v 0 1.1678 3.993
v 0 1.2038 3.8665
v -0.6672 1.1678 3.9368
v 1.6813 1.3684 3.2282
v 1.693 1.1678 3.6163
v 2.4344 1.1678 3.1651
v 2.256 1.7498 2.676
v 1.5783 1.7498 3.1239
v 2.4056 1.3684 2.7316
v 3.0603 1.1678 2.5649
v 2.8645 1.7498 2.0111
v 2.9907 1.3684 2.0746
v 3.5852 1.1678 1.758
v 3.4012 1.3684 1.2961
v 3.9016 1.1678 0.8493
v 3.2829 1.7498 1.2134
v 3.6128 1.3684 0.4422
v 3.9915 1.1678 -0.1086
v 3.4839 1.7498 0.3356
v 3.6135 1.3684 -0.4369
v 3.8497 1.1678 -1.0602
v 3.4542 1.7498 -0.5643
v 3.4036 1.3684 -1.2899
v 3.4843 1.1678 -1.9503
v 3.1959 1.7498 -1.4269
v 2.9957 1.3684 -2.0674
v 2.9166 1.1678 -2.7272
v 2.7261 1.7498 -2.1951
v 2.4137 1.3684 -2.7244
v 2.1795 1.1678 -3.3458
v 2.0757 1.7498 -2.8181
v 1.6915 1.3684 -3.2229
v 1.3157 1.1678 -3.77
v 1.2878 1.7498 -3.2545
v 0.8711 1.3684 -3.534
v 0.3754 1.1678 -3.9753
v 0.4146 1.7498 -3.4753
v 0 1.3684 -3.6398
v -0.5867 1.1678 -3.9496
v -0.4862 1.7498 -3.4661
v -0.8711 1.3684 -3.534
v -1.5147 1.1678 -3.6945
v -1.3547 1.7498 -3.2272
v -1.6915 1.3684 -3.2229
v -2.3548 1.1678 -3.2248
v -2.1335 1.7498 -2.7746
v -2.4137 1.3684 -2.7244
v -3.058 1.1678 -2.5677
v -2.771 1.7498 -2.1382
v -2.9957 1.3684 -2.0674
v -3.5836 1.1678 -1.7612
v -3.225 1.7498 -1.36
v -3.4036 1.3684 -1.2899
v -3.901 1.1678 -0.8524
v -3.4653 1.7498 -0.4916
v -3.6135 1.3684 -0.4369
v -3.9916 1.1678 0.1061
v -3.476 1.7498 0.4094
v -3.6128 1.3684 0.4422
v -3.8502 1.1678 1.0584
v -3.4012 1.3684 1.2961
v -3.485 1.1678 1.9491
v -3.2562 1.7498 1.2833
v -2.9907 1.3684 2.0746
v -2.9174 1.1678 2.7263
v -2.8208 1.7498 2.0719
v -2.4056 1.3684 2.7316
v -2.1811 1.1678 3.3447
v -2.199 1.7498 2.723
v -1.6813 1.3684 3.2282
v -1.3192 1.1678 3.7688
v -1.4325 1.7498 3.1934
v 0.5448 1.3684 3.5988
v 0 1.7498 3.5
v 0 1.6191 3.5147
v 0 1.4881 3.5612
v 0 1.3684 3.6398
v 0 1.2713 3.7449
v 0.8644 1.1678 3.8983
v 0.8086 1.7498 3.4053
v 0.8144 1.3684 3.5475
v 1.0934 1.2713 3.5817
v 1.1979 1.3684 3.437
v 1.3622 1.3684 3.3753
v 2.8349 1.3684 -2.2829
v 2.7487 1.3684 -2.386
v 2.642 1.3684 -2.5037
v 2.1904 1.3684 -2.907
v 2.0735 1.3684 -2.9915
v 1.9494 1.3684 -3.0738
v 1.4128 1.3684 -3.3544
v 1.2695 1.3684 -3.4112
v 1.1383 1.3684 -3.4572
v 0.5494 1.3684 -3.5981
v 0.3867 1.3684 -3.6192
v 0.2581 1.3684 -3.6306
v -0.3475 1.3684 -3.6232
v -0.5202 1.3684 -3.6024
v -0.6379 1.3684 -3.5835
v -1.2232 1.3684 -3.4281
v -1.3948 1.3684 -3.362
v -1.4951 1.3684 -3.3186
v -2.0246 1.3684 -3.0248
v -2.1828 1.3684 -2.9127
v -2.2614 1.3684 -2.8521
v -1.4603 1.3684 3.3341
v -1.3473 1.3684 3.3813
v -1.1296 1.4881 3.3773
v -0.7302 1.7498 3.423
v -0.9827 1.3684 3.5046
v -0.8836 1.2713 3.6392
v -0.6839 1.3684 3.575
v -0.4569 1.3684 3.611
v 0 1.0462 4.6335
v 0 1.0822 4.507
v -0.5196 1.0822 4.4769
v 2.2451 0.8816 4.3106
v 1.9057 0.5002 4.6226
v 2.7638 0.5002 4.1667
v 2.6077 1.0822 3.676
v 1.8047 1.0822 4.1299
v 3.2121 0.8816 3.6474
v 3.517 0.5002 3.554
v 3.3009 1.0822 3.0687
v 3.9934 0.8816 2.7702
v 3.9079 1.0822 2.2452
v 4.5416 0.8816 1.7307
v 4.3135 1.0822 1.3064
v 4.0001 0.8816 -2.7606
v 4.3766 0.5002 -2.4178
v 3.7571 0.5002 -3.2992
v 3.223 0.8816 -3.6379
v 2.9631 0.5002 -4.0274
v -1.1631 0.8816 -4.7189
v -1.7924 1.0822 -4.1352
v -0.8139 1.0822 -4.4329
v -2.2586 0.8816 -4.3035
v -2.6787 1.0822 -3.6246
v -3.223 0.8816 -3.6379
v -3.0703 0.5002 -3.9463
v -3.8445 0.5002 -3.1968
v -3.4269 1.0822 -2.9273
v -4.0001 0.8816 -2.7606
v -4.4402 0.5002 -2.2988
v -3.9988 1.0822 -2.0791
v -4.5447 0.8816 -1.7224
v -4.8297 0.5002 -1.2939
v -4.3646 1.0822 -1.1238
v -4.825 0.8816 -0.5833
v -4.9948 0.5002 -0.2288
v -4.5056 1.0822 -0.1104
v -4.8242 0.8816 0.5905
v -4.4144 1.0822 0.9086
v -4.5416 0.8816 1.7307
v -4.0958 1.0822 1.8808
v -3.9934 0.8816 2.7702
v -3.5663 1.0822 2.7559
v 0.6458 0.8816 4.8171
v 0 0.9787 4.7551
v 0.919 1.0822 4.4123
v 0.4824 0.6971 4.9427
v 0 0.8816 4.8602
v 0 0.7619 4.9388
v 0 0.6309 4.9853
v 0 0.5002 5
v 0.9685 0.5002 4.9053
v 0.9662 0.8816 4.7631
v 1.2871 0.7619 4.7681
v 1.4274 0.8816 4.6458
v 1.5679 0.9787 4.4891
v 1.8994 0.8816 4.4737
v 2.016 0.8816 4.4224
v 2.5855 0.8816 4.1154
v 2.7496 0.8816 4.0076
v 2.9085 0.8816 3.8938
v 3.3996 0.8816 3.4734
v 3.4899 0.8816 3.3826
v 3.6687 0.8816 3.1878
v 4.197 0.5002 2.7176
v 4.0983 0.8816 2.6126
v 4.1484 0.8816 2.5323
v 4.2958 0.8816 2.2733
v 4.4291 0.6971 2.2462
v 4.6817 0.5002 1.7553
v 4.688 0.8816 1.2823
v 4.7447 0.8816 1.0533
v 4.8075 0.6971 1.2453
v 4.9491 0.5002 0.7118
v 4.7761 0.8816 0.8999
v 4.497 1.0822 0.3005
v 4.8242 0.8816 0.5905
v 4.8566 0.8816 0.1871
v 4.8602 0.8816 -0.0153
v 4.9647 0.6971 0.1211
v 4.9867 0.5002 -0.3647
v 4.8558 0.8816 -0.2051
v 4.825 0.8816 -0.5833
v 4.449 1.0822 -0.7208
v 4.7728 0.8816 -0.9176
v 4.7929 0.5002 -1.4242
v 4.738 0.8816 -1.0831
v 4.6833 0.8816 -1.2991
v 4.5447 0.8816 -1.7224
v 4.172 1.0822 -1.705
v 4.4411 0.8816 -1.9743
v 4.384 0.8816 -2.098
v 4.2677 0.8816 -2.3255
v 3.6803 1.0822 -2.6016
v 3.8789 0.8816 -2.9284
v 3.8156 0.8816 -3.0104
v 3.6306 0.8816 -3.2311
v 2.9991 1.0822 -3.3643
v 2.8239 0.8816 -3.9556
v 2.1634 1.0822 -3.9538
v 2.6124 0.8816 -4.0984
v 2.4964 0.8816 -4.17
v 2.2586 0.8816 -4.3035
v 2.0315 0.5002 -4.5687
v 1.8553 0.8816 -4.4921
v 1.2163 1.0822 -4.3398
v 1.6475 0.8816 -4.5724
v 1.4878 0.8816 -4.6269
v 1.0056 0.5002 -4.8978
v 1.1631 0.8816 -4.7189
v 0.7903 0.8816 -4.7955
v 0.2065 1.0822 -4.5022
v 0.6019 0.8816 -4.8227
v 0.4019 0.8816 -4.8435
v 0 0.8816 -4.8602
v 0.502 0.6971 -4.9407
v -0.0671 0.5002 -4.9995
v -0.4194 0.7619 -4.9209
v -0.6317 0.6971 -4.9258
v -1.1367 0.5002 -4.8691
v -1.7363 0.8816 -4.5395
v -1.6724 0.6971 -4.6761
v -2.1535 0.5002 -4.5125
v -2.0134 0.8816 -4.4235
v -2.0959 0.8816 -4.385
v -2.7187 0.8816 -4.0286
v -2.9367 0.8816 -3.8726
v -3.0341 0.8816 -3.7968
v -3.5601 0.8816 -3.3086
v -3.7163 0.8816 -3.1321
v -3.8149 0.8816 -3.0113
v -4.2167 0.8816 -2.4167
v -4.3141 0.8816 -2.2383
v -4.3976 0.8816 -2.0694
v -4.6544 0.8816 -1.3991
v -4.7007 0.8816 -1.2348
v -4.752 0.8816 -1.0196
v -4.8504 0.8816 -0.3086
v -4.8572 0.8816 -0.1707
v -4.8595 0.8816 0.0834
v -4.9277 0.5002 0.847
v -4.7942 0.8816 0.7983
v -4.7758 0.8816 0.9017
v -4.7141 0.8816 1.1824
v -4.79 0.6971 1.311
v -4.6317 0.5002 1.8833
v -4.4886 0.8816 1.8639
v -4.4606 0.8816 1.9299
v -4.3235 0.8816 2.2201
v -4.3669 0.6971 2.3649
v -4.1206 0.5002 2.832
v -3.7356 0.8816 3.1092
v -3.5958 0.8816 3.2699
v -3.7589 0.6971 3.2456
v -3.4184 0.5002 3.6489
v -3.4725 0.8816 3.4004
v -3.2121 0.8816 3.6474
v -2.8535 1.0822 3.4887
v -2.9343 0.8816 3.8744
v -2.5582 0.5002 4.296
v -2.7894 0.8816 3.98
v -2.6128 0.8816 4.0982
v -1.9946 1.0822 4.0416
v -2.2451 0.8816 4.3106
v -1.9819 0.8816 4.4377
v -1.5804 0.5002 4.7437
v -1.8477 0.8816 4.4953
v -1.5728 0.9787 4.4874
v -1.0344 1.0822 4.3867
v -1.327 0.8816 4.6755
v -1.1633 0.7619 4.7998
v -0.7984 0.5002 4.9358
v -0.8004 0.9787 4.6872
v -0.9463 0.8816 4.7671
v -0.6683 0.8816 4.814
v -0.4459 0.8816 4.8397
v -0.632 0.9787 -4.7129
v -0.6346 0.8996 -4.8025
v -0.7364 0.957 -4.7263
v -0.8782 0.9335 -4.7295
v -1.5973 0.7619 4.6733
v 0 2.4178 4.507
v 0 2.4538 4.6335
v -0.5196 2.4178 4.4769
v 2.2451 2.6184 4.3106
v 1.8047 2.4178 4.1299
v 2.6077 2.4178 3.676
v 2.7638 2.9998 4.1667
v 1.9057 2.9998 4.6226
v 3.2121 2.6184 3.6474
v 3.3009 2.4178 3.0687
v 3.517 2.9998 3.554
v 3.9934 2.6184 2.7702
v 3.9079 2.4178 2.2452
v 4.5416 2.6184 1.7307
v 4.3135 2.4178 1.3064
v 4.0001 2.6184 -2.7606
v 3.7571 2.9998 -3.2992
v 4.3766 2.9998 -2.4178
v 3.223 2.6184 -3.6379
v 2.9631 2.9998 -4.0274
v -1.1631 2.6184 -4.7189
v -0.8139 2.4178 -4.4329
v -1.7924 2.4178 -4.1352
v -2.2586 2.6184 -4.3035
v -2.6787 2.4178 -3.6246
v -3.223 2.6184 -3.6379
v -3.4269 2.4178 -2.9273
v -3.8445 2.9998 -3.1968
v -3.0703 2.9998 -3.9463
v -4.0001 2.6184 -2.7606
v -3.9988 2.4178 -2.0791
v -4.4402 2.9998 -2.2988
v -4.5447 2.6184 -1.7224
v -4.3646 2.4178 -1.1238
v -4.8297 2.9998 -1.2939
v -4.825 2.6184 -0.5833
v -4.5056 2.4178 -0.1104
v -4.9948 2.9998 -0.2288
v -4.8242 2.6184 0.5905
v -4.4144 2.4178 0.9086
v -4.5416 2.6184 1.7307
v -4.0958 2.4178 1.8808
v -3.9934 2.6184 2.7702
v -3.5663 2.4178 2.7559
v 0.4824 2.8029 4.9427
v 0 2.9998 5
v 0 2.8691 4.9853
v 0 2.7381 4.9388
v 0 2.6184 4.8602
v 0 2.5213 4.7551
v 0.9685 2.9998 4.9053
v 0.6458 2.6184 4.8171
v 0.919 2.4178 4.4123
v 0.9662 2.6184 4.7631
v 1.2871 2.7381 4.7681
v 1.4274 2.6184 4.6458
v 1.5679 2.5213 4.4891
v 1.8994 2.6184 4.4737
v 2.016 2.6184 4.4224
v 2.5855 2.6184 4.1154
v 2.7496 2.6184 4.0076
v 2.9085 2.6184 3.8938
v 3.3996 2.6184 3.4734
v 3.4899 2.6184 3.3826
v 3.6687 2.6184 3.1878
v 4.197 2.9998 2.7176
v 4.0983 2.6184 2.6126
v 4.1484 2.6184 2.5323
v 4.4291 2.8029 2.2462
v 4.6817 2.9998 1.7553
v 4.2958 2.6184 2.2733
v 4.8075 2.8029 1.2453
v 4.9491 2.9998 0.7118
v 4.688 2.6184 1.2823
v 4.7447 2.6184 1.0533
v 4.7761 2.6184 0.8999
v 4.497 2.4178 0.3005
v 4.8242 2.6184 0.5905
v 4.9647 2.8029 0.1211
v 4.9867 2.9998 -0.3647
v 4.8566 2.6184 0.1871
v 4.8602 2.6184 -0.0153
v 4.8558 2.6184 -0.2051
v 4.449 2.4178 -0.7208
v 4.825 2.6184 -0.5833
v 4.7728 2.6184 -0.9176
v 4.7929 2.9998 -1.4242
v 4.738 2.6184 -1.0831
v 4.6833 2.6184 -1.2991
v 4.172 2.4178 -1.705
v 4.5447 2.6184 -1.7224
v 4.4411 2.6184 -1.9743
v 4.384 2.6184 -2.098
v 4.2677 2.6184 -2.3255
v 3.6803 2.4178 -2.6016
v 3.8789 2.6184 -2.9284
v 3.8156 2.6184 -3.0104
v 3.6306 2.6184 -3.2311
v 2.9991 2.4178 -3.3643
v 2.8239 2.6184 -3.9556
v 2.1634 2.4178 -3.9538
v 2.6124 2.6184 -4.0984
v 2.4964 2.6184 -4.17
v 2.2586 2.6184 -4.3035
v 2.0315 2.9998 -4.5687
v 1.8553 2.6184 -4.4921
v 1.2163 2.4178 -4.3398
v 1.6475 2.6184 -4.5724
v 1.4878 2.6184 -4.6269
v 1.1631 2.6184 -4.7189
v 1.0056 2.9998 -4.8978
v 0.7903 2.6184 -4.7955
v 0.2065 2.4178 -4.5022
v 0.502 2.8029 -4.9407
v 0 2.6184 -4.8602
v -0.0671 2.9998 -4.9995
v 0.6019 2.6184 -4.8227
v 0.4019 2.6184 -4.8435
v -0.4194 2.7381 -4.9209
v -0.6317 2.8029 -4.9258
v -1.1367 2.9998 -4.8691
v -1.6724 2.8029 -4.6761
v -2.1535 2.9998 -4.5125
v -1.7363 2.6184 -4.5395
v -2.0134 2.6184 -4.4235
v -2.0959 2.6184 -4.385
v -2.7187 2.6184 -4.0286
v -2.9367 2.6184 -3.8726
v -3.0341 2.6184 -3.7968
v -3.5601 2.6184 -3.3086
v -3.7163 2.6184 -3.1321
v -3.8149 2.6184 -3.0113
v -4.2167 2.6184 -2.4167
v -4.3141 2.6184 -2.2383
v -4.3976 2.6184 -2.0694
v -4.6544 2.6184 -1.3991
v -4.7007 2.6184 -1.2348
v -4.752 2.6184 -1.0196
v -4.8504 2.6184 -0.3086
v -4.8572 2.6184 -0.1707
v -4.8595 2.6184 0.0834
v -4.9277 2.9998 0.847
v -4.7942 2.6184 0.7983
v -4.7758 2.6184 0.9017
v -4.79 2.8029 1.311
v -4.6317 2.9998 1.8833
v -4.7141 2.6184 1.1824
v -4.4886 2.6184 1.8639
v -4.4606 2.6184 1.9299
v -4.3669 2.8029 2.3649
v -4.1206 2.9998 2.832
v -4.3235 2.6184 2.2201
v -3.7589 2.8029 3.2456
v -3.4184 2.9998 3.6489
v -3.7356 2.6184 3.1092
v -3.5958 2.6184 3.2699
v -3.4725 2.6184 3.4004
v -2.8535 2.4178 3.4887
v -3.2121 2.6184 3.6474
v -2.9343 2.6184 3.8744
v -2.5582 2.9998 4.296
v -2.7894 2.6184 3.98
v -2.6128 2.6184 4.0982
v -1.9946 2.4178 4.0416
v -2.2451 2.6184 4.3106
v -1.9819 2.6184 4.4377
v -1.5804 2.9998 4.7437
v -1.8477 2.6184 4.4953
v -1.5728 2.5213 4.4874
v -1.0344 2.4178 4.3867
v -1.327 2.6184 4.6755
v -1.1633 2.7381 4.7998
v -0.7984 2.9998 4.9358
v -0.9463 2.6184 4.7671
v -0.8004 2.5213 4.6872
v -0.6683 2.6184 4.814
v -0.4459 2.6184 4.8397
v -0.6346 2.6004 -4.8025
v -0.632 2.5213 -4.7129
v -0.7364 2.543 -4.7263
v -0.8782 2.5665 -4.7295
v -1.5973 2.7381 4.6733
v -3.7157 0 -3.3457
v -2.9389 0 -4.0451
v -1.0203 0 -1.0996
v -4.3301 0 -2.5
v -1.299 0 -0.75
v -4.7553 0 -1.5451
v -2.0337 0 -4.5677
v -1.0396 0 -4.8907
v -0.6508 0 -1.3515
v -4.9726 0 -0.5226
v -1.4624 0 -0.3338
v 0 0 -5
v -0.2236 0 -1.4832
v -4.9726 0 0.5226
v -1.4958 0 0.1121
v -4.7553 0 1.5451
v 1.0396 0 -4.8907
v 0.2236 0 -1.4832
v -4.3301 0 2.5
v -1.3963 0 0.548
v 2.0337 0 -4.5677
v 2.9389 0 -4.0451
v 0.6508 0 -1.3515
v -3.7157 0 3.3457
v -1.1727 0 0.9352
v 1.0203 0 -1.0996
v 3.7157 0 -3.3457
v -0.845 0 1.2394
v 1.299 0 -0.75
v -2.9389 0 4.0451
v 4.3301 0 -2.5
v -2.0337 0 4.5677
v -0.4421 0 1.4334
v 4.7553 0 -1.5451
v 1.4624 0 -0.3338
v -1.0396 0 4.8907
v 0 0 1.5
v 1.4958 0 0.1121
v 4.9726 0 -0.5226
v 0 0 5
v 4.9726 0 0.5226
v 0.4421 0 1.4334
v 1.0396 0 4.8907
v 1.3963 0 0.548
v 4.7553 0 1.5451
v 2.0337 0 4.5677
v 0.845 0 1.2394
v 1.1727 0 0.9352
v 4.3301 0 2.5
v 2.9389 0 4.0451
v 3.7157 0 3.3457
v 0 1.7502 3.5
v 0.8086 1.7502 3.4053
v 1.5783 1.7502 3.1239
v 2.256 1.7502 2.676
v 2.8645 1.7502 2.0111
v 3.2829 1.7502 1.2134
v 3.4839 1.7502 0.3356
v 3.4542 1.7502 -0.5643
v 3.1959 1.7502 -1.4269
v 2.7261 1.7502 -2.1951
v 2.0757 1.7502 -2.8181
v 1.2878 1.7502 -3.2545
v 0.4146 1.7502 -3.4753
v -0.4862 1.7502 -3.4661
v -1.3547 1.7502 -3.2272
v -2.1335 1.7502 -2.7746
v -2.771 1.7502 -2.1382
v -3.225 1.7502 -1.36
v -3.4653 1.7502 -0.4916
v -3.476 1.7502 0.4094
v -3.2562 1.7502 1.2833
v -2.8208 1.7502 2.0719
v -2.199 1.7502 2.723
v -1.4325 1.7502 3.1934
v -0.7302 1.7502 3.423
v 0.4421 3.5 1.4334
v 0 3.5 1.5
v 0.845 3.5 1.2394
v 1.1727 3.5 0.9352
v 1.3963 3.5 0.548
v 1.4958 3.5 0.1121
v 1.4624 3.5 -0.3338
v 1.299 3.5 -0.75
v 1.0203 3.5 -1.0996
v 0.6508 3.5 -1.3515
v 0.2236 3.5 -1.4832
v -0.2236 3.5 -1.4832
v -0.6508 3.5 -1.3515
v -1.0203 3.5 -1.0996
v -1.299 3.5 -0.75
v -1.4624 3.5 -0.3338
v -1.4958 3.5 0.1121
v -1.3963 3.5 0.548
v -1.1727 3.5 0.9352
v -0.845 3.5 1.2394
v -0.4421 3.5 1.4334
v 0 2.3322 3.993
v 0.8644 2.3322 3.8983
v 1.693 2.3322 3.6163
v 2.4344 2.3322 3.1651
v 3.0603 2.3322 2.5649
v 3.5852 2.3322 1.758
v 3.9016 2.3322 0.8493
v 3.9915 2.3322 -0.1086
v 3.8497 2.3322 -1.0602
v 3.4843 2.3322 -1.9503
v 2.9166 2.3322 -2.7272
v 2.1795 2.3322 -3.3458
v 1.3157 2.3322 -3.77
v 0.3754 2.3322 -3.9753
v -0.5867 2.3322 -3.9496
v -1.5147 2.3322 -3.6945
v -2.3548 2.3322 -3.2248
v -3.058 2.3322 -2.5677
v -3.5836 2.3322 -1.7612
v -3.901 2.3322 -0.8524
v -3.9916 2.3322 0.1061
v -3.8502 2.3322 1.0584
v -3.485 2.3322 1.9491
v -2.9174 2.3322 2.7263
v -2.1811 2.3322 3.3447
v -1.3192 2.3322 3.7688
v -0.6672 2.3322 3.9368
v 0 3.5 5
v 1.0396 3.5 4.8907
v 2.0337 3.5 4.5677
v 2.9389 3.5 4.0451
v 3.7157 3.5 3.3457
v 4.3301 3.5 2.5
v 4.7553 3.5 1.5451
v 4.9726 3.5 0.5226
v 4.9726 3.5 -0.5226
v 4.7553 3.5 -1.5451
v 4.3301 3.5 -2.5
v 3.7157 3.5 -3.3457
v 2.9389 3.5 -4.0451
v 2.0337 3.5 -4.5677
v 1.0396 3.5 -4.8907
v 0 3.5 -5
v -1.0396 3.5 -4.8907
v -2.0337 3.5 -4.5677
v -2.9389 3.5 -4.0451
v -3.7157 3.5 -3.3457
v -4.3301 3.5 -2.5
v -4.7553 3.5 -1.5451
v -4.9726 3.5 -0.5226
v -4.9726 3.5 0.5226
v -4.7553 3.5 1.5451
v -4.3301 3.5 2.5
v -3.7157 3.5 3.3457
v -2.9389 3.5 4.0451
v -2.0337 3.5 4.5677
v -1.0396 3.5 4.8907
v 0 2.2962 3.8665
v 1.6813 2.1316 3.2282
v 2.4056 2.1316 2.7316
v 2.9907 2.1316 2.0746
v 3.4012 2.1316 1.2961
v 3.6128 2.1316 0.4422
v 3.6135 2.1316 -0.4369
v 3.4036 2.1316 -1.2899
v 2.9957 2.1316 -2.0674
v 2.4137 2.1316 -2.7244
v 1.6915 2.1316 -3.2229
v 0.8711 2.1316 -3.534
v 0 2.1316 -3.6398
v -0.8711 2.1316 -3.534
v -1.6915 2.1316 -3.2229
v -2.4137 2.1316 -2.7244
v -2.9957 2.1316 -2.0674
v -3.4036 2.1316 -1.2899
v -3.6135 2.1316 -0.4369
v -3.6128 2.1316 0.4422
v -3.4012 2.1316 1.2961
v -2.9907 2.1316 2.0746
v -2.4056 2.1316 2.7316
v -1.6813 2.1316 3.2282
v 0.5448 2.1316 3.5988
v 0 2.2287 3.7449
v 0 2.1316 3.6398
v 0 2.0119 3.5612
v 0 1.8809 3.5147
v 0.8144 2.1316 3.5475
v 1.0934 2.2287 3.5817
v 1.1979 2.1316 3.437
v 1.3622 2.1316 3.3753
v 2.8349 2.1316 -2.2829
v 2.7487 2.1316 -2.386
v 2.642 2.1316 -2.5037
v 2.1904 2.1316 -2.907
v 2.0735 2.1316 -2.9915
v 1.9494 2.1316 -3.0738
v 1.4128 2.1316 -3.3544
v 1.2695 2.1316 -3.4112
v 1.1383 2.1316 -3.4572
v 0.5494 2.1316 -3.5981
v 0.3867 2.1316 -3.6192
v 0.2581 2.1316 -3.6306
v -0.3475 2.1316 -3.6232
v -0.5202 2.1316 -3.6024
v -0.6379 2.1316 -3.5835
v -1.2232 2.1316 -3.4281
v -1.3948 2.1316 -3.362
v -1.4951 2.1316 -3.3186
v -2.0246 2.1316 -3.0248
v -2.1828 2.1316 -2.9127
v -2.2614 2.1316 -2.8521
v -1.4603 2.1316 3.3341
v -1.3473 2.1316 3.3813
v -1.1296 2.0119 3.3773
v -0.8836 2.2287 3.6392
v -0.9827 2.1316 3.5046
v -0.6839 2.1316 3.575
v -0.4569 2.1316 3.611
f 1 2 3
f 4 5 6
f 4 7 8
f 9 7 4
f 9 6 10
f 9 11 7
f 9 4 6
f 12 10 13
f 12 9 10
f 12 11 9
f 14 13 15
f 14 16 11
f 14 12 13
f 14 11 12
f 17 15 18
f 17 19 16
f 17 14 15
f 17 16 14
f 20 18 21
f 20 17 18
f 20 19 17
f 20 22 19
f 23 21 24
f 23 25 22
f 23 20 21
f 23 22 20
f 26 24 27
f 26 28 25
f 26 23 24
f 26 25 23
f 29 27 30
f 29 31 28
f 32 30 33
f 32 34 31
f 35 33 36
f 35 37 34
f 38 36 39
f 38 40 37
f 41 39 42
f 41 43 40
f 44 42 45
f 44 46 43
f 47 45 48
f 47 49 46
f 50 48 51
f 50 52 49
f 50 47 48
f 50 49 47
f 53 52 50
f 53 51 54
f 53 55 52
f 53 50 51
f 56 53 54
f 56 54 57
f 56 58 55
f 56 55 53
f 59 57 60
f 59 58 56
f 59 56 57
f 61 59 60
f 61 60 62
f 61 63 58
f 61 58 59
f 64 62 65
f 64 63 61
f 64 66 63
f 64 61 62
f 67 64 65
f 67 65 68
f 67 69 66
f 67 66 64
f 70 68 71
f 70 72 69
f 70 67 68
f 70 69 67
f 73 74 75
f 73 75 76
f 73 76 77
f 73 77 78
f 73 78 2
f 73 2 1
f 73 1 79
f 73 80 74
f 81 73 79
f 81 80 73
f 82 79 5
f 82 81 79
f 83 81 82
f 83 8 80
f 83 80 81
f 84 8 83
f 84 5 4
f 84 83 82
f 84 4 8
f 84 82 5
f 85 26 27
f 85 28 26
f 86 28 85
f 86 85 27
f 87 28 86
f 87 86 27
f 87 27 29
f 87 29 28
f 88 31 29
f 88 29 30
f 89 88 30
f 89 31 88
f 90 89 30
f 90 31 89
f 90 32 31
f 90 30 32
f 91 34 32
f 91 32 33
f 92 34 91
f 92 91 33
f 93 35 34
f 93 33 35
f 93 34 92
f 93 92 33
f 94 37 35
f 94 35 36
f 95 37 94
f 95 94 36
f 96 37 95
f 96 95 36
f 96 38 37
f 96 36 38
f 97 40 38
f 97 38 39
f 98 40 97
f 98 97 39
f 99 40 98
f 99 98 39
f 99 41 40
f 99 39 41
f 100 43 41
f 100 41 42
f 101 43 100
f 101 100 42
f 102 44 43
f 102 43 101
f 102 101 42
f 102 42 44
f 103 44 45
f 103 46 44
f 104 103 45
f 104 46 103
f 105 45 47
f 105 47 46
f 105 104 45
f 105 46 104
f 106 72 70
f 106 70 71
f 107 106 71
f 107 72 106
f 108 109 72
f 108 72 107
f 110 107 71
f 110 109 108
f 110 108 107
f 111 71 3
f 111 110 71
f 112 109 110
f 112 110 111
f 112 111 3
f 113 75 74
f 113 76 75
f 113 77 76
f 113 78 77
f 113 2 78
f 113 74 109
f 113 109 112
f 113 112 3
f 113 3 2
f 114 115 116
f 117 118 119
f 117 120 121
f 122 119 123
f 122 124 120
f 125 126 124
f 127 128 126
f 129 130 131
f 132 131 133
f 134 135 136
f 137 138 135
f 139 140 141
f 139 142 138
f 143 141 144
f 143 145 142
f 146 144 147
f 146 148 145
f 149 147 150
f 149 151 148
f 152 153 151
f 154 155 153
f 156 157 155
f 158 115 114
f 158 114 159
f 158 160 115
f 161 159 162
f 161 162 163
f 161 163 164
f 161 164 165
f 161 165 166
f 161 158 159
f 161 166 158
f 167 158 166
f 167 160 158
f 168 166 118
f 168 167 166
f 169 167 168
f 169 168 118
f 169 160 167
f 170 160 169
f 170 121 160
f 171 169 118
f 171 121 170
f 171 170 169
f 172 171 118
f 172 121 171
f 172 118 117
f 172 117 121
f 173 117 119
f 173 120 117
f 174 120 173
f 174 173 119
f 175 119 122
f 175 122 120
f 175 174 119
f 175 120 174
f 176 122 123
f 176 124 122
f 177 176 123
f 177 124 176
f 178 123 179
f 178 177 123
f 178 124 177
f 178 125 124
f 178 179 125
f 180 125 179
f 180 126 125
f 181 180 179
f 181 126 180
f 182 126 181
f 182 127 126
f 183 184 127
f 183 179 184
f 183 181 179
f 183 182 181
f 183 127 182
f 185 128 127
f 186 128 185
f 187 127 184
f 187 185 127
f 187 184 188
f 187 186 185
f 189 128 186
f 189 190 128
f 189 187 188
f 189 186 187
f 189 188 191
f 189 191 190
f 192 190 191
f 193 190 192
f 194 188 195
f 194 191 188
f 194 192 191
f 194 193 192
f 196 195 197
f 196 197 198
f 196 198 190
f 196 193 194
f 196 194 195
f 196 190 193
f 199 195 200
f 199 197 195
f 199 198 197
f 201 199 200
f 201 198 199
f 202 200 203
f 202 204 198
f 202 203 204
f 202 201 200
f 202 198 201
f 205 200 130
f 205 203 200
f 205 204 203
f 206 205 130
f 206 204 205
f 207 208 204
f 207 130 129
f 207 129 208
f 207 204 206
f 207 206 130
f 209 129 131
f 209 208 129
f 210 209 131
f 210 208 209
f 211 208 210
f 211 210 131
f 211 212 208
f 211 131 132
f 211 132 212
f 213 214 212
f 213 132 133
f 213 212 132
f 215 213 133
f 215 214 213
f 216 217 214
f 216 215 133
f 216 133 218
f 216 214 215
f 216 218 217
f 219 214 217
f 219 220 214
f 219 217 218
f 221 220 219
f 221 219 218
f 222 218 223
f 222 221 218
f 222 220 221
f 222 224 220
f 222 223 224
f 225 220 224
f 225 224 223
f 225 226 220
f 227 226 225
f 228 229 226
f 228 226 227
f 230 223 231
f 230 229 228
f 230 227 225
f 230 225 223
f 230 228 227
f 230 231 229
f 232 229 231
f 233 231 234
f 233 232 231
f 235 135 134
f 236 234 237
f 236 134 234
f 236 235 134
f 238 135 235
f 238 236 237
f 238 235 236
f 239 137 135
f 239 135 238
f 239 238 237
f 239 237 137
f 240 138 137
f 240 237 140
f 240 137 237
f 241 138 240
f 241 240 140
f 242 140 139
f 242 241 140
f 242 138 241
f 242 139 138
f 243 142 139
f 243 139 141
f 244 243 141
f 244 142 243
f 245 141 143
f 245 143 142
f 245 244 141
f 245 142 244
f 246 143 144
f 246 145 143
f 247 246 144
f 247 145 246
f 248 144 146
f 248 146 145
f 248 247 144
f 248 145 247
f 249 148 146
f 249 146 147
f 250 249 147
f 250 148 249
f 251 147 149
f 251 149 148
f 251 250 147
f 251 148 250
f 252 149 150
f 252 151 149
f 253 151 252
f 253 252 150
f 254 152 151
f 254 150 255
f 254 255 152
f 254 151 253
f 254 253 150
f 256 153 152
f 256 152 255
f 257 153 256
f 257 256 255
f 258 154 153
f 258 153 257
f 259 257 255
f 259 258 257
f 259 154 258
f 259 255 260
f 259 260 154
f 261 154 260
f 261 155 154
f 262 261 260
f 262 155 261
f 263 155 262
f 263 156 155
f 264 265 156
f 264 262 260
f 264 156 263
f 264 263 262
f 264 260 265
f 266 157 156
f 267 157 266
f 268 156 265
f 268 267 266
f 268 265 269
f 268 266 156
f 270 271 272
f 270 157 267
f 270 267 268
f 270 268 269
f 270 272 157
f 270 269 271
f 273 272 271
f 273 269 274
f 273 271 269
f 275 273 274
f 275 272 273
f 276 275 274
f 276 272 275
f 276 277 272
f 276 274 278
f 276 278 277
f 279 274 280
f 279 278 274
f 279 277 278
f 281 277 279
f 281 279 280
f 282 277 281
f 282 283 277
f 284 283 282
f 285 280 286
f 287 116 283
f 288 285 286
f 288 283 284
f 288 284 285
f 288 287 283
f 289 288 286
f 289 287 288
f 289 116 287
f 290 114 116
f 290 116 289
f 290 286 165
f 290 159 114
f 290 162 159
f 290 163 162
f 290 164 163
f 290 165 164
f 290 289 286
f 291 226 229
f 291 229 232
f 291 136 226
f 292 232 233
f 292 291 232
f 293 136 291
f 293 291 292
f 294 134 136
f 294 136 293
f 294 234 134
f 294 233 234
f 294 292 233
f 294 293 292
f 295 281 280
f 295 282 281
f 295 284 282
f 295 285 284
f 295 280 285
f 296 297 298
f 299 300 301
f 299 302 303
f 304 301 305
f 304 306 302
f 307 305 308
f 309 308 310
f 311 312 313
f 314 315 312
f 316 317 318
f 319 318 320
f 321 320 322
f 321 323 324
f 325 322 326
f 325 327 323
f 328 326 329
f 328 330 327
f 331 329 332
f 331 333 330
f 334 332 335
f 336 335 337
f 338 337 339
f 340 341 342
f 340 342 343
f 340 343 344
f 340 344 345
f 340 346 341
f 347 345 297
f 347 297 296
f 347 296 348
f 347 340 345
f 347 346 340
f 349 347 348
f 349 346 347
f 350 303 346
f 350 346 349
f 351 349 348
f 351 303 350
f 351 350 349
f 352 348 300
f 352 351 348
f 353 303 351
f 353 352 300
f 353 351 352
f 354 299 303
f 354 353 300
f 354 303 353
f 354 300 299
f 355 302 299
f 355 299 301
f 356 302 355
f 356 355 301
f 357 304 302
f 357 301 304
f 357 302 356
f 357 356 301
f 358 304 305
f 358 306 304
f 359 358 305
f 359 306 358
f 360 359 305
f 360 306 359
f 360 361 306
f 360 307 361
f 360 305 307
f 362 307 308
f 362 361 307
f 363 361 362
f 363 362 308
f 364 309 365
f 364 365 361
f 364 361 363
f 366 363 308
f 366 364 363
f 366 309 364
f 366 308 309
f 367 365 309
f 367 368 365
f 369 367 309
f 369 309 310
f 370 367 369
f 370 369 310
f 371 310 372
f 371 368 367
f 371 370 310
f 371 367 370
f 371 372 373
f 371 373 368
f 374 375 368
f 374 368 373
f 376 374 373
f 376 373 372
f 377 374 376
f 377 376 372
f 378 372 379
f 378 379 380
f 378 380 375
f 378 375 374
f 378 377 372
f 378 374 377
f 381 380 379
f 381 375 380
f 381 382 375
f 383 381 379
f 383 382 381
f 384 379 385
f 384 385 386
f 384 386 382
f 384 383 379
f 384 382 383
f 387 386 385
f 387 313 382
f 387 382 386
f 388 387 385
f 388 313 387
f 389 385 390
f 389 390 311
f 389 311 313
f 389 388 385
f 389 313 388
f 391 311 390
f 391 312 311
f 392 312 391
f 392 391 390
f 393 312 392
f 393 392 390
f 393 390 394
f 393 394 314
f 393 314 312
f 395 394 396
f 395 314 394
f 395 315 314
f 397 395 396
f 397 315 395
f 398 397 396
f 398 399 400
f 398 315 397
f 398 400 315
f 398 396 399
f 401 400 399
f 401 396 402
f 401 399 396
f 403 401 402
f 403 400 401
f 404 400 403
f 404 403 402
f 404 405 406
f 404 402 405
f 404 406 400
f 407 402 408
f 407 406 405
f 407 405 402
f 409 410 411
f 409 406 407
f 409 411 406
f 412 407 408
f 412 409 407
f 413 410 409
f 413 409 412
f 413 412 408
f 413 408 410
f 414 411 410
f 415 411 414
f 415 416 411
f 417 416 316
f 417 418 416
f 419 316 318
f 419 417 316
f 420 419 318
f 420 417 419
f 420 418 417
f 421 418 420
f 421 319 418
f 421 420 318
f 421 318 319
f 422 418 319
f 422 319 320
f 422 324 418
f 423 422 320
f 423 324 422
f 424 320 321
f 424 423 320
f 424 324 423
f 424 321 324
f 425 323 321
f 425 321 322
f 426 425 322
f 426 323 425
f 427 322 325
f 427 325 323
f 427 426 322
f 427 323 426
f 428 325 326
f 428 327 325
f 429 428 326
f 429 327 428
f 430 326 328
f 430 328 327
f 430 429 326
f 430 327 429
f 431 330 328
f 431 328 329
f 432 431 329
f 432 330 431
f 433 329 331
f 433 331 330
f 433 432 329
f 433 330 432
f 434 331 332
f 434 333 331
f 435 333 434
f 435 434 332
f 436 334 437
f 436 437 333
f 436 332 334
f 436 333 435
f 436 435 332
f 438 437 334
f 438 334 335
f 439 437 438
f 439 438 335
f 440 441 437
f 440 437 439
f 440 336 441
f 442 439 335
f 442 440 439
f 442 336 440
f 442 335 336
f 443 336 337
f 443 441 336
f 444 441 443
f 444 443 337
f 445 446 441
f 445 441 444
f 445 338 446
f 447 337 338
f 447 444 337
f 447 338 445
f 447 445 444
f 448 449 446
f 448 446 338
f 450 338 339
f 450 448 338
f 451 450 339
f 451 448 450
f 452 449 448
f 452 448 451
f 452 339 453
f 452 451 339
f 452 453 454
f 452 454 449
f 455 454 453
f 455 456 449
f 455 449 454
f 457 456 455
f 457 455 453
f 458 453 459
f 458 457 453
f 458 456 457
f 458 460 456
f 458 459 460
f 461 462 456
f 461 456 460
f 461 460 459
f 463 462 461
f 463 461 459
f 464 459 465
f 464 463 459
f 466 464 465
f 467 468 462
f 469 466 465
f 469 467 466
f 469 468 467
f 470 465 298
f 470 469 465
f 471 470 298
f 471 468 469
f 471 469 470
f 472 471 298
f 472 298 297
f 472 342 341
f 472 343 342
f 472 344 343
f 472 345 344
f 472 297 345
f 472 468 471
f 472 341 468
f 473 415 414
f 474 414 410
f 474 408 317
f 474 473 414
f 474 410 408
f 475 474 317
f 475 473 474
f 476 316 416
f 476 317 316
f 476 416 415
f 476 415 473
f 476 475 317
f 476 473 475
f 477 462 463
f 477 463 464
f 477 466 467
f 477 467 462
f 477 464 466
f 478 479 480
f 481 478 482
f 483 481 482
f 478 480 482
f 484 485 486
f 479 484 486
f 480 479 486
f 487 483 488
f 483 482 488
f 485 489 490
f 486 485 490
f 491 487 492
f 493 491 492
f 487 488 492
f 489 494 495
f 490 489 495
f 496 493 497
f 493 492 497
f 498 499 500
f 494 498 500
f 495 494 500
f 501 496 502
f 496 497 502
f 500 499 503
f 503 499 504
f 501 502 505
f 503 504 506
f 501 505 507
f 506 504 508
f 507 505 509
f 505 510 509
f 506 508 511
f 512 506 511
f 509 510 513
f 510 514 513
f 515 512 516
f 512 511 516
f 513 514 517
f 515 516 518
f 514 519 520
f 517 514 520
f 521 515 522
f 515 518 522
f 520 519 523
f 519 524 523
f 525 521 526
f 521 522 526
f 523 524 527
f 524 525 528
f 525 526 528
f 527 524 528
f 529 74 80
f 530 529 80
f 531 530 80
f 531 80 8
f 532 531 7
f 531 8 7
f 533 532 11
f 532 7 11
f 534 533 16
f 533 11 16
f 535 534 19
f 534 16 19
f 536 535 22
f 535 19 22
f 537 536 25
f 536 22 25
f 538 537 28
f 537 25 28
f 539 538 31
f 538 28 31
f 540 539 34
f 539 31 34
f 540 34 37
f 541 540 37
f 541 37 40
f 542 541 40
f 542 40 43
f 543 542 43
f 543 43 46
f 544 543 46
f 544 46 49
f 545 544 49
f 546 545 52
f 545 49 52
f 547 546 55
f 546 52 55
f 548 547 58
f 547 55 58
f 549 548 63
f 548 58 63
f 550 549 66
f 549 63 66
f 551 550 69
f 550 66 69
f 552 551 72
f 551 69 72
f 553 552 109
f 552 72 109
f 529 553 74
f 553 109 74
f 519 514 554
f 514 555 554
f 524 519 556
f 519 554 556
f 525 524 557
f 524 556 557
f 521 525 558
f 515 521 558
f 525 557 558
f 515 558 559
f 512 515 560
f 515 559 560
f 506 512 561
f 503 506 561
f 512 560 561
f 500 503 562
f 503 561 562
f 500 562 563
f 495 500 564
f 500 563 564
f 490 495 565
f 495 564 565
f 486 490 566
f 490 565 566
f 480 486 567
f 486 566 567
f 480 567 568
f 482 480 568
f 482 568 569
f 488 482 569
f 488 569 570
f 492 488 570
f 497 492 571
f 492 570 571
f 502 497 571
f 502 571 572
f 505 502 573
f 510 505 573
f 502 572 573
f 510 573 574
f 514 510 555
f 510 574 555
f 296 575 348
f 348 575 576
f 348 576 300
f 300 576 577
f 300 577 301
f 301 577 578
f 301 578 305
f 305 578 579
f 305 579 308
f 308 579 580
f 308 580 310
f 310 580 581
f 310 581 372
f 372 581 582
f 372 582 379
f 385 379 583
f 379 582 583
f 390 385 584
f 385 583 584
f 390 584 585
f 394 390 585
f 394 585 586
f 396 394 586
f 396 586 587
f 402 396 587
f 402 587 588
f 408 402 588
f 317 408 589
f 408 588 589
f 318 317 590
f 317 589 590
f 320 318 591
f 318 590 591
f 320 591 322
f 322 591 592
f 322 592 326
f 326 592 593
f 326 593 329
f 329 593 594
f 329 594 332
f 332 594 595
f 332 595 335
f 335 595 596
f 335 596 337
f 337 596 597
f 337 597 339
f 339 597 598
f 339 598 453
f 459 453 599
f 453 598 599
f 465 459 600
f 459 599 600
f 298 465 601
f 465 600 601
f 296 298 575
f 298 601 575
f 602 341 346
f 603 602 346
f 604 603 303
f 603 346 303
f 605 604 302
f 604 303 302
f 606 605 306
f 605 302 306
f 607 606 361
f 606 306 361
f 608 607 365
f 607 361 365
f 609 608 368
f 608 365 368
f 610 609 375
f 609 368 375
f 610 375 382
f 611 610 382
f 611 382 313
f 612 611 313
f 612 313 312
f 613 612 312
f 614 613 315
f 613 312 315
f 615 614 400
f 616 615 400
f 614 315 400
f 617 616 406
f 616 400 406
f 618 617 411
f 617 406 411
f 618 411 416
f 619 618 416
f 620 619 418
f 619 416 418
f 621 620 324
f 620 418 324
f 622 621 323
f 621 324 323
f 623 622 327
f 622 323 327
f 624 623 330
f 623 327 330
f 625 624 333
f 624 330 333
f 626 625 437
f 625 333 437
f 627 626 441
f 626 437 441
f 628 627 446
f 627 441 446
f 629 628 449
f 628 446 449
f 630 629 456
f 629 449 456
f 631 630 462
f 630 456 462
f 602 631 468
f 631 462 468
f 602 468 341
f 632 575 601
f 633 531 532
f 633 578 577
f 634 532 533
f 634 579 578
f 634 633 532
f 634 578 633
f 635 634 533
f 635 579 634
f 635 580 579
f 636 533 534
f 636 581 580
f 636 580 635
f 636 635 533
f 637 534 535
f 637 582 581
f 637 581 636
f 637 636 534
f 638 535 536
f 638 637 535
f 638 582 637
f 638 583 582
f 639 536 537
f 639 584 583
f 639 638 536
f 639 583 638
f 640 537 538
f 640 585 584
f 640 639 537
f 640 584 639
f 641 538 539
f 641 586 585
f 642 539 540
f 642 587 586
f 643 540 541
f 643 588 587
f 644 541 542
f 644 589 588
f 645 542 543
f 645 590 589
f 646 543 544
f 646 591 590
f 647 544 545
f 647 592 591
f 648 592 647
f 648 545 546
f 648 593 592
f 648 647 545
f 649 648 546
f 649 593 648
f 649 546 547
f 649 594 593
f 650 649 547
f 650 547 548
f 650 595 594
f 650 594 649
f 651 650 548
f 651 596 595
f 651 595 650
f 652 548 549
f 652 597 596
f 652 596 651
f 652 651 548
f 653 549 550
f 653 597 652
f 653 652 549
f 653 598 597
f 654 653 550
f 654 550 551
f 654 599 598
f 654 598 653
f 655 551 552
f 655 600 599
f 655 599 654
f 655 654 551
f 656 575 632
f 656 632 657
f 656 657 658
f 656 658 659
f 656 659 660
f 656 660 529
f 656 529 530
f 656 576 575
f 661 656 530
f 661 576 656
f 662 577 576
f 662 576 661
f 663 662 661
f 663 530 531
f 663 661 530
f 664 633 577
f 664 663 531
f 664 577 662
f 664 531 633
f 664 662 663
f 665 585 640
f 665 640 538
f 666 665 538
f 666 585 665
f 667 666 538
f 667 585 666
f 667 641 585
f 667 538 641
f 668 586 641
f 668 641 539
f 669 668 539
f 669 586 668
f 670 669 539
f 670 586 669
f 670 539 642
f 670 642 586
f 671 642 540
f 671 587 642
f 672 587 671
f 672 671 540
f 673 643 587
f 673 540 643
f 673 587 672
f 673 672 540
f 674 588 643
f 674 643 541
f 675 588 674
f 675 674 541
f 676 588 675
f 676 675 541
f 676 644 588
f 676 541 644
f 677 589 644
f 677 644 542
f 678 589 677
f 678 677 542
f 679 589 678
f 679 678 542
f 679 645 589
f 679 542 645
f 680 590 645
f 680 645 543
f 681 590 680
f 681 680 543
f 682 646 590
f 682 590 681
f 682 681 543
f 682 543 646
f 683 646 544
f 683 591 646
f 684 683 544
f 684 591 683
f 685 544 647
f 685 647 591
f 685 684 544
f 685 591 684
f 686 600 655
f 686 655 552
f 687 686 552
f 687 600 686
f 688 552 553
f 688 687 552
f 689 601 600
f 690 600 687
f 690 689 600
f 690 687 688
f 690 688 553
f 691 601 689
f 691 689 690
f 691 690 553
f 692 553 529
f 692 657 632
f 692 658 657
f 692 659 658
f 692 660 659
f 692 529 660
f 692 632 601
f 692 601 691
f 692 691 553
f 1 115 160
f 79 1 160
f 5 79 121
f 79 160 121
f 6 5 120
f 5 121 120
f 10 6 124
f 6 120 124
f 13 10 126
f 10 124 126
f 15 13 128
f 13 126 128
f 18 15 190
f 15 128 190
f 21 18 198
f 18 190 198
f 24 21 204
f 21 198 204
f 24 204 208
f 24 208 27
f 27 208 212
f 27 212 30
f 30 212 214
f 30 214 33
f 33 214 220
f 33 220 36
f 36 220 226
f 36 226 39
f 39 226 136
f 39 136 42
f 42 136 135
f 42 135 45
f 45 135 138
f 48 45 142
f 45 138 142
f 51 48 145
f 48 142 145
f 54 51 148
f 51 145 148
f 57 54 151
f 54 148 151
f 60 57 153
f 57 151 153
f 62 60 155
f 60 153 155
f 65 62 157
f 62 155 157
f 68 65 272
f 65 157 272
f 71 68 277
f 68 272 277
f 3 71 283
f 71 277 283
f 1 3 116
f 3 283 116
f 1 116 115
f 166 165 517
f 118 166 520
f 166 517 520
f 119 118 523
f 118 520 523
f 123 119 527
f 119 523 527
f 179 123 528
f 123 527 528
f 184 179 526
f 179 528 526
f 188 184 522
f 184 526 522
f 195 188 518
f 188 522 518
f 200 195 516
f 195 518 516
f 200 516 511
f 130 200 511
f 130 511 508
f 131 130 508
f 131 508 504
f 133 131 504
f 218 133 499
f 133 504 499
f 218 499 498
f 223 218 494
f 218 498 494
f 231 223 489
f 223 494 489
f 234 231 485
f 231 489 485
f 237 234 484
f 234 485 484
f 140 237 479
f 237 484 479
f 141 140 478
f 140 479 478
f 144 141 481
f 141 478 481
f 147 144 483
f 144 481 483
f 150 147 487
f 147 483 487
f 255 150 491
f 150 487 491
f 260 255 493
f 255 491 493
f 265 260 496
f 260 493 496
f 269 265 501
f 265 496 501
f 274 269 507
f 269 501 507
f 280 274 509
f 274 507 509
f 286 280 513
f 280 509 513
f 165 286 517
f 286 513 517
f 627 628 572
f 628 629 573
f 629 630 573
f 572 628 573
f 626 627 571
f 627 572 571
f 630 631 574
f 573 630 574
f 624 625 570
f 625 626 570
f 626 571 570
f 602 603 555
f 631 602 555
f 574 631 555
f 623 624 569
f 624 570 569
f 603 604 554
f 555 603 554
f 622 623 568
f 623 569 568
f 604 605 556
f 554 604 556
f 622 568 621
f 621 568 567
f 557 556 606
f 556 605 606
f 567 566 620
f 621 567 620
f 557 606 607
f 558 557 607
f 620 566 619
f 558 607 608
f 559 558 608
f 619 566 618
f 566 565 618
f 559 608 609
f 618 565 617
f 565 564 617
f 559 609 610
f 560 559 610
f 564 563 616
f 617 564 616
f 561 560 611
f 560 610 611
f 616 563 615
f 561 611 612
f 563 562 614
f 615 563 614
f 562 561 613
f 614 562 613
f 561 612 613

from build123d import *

# Parameters (mm, degrees)
F2_R = 0.59


with BuildPart() as f1:
    # F0 (on Right) → F1 (revolve)
    with BuildSketch(Plane.YZ):
        Polygon((0, 5), (0, 1.5), (3.5, 1.5), (3.5, 5), (2.5, 5), (2.25, 3.5), (1.25, 3.5), (1, 5), align=None)
    revolve(axis=Axis((0, 1.75, 0), (0, 1, 0)))

    # F2
    f2_edges = [f1.edges().sort_by_distance(p)[0] for p in [
        (0, 1.25, -3.5),
        (0, 1, -5),
        (0, 1.125, 4.25),
        (0, 2.5, -5),
        (0, 2.25, -3.5),
        (0, 2.375, 4.25),
    ]]
    fillet(f2_edges, radius=F2_R)


solid = f1.part
